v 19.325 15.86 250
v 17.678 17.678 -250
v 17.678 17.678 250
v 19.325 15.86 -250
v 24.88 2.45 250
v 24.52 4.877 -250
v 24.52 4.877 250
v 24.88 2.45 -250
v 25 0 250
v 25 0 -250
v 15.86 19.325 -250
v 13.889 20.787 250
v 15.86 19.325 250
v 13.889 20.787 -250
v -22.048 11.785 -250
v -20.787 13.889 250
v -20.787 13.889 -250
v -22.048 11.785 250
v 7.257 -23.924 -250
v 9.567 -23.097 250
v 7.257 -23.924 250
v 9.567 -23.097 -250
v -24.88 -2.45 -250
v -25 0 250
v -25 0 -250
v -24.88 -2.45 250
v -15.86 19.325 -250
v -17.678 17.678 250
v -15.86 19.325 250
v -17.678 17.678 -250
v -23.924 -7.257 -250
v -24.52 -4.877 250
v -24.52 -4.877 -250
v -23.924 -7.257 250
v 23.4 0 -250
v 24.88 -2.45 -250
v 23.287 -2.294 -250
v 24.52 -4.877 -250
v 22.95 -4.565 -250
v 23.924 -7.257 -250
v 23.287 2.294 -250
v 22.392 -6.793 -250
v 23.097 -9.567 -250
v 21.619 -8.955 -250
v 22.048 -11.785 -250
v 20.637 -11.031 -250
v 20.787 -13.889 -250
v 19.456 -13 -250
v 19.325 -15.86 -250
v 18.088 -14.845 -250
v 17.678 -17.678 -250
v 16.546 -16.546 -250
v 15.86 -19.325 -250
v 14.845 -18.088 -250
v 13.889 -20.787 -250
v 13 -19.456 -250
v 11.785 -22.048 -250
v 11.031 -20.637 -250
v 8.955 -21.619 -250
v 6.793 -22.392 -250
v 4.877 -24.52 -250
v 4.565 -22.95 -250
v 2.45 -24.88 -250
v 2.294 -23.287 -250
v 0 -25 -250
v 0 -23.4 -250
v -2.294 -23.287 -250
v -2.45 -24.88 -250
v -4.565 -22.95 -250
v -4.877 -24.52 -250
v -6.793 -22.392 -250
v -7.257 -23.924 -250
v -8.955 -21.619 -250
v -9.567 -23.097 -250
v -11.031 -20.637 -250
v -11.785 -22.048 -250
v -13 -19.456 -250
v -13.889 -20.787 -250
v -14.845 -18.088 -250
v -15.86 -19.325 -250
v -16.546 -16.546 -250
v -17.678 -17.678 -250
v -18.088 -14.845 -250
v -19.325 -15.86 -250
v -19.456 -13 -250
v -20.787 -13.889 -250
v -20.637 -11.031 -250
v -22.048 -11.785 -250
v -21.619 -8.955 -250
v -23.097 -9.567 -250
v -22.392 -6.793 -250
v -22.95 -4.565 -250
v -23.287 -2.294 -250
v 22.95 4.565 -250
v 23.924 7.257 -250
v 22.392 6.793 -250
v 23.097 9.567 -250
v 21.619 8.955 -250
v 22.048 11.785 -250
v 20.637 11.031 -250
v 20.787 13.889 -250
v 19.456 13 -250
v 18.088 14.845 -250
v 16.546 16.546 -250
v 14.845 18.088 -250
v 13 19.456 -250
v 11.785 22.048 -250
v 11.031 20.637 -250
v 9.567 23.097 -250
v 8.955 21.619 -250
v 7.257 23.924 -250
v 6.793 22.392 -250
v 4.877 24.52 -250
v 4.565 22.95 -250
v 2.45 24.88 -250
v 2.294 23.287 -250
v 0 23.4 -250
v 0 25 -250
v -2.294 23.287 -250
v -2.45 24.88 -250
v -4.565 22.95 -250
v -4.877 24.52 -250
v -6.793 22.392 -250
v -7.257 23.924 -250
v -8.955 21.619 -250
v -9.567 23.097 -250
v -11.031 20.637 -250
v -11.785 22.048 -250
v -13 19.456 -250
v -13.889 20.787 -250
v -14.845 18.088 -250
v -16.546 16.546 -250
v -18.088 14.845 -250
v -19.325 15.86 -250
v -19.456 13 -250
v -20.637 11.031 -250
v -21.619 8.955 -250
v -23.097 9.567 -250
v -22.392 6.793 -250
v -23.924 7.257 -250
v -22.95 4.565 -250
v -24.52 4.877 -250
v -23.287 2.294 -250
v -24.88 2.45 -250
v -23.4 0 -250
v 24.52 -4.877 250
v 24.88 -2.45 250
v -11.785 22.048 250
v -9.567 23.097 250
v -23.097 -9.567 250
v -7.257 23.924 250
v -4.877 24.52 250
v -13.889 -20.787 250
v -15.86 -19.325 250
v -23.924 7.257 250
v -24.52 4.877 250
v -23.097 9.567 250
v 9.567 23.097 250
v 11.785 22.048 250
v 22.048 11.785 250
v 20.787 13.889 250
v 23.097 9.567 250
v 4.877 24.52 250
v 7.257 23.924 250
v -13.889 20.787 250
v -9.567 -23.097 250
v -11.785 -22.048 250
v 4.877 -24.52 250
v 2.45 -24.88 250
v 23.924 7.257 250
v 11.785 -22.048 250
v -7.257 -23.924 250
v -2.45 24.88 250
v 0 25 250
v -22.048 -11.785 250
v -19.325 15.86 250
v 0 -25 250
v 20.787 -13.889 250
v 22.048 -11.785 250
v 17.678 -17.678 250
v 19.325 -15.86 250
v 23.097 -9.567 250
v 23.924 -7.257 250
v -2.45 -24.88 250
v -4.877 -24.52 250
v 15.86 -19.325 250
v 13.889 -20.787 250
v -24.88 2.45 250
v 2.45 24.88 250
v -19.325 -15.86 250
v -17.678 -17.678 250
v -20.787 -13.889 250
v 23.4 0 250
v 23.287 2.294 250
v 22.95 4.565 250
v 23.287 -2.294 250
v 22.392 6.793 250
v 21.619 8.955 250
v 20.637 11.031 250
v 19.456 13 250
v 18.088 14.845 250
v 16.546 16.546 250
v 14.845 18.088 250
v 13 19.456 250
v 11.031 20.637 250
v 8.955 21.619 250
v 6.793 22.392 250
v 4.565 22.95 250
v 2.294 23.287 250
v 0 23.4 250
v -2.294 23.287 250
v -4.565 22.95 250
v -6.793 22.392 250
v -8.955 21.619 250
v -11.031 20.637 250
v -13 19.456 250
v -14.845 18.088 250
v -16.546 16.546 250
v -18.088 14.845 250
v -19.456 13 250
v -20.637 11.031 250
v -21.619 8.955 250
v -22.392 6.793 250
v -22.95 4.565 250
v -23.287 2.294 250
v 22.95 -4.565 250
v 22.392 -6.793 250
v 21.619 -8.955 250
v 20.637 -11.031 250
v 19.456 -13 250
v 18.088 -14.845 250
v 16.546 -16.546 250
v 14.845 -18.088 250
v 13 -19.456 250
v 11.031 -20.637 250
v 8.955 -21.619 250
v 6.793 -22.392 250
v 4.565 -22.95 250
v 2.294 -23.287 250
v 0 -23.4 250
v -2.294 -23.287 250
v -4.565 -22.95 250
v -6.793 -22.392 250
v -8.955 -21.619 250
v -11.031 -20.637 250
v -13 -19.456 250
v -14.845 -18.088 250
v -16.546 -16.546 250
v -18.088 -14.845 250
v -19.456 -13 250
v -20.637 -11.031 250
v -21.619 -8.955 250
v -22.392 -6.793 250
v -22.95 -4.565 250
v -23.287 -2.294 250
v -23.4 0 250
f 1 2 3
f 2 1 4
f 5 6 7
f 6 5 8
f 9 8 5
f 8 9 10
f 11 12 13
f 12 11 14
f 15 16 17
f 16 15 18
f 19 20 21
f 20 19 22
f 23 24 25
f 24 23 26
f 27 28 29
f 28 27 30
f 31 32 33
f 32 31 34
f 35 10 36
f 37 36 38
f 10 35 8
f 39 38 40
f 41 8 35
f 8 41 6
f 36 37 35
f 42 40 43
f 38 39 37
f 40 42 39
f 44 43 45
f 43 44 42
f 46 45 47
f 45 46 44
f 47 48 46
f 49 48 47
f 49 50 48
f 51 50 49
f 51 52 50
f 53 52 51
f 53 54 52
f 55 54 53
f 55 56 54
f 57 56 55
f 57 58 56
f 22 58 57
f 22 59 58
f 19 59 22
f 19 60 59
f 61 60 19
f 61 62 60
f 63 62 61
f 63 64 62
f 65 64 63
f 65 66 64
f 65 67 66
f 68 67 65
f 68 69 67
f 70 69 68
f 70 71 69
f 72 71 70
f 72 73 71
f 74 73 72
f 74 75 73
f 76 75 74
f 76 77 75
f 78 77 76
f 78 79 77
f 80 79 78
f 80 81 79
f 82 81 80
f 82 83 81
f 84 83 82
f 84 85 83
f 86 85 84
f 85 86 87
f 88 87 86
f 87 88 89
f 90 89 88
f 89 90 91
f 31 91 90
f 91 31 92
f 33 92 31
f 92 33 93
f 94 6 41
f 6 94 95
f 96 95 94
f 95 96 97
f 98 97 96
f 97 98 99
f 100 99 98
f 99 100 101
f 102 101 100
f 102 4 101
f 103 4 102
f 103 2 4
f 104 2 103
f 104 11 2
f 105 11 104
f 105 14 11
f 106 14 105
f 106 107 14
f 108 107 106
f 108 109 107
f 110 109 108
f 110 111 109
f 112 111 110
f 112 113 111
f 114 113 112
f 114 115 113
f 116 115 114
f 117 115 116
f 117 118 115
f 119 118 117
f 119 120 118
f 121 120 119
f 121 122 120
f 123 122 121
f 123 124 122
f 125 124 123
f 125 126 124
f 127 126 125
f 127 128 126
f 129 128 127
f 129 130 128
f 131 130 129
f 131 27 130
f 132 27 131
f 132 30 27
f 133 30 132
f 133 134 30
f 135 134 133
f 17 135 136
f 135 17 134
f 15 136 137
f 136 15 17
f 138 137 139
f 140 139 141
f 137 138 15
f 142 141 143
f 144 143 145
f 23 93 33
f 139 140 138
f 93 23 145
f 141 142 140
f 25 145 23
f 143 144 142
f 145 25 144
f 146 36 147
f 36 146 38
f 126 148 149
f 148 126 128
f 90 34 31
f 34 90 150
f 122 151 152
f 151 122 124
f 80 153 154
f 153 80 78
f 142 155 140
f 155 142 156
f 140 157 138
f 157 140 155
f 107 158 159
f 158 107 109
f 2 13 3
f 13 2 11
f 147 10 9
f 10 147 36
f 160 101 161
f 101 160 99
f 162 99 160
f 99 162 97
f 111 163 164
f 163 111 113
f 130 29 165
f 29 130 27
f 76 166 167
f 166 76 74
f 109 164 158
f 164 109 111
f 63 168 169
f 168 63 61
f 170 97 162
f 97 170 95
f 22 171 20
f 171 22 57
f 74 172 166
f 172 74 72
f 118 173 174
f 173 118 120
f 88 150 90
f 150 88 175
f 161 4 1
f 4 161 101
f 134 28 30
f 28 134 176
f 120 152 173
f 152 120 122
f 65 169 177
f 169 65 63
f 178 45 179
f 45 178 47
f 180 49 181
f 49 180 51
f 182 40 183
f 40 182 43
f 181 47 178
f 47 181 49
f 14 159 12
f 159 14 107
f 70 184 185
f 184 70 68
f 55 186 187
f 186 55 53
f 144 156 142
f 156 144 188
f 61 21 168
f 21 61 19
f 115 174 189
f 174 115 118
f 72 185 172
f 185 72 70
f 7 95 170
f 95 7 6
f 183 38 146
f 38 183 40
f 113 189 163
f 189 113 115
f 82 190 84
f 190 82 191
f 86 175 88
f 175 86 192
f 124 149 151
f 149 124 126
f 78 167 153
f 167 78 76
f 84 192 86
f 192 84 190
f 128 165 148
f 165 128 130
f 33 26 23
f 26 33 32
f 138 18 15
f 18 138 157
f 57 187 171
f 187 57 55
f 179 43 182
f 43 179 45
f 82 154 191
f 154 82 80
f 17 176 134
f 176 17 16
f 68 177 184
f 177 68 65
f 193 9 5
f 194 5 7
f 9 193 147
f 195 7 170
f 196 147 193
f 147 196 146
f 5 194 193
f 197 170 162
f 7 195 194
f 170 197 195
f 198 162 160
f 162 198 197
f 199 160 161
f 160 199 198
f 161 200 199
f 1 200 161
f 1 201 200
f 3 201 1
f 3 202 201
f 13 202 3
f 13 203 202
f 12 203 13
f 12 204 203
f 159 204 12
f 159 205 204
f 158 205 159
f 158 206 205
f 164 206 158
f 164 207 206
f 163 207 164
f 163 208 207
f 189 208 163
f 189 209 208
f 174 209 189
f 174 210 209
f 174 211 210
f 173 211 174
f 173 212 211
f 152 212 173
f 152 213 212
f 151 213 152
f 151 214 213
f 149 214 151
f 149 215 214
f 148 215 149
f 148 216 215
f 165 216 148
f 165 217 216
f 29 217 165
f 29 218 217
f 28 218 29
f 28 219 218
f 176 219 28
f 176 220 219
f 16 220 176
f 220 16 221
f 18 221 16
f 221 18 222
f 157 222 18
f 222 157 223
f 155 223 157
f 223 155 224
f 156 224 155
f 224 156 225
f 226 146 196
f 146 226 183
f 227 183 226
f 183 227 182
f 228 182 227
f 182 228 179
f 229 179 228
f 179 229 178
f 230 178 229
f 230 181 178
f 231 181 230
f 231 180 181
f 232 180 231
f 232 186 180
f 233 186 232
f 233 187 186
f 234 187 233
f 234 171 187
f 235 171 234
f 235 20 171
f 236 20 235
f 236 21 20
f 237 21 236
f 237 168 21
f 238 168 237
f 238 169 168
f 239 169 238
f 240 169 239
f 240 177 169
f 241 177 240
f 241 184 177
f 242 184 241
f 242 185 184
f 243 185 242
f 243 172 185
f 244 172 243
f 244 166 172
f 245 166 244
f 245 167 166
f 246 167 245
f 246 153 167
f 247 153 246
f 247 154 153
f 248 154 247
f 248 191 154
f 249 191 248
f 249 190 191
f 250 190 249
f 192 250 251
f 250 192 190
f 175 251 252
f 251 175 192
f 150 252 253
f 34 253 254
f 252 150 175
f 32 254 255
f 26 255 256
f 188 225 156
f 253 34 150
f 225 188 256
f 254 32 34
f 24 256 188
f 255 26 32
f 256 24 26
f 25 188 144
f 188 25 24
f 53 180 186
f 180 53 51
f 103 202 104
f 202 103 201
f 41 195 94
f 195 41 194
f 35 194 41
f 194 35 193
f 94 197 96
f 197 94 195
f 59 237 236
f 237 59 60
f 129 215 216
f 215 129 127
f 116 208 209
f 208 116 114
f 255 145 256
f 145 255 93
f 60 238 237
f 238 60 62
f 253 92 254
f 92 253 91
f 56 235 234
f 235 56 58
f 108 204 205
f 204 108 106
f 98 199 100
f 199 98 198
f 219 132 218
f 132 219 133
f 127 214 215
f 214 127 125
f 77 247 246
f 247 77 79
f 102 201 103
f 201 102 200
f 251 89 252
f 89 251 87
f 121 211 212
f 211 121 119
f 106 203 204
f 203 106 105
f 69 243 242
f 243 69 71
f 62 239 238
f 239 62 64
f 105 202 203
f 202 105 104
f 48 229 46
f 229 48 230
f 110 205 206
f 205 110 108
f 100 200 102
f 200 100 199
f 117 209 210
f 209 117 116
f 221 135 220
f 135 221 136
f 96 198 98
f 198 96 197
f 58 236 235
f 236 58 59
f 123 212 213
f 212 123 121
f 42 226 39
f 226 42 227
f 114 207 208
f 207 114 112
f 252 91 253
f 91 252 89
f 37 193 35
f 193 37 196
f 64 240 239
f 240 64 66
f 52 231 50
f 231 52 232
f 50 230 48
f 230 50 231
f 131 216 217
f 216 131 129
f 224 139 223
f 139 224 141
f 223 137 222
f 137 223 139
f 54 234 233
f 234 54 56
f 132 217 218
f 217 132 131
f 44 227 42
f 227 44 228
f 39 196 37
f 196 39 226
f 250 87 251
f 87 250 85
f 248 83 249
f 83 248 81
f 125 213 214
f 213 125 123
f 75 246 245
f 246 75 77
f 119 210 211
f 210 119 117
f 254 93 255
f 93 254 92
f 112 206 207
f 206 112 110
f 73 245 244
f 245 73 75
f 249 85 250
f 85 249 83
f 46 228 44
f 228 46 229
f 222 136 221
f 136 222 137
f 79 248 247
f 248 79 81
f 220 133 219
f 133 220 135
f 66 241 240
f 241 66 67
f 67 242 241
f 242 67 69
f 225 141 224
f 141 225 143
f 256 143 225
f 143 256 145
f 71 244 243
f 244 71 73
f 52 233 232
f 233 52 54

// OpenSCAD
// Parameters
length_mm = 500; //[250:1000:1]
ht50_outer_diameter_mm = 50; //[45:60:0.5]
wall_thickness_mm = 1.8; //[1:4:0.1]
bore_clearance_mm = 0.2; //[0:1:0.05]

// Ht Pipe - complete geometry
module ht_pipe() {
  color([0.85, 0.85, 0.8]) { // PVC color
    difference() {
      // Outer pipe
      cylinder(h=length_mm, r=ht50_outer_diameter_mm/2, center=true, $fn=64);
      // Inner bore
      cylinder(h=length_mm + 2*bore_clearance_mm, 
               r=ht50_outer_diameter_mm/2 - wall_thickness_mm + bore_clearance_mm, 
               center=true, $fn=64);
    }
  }
}

// Assembly
module assembly() {
  ht_pipe();
}

assembly();
